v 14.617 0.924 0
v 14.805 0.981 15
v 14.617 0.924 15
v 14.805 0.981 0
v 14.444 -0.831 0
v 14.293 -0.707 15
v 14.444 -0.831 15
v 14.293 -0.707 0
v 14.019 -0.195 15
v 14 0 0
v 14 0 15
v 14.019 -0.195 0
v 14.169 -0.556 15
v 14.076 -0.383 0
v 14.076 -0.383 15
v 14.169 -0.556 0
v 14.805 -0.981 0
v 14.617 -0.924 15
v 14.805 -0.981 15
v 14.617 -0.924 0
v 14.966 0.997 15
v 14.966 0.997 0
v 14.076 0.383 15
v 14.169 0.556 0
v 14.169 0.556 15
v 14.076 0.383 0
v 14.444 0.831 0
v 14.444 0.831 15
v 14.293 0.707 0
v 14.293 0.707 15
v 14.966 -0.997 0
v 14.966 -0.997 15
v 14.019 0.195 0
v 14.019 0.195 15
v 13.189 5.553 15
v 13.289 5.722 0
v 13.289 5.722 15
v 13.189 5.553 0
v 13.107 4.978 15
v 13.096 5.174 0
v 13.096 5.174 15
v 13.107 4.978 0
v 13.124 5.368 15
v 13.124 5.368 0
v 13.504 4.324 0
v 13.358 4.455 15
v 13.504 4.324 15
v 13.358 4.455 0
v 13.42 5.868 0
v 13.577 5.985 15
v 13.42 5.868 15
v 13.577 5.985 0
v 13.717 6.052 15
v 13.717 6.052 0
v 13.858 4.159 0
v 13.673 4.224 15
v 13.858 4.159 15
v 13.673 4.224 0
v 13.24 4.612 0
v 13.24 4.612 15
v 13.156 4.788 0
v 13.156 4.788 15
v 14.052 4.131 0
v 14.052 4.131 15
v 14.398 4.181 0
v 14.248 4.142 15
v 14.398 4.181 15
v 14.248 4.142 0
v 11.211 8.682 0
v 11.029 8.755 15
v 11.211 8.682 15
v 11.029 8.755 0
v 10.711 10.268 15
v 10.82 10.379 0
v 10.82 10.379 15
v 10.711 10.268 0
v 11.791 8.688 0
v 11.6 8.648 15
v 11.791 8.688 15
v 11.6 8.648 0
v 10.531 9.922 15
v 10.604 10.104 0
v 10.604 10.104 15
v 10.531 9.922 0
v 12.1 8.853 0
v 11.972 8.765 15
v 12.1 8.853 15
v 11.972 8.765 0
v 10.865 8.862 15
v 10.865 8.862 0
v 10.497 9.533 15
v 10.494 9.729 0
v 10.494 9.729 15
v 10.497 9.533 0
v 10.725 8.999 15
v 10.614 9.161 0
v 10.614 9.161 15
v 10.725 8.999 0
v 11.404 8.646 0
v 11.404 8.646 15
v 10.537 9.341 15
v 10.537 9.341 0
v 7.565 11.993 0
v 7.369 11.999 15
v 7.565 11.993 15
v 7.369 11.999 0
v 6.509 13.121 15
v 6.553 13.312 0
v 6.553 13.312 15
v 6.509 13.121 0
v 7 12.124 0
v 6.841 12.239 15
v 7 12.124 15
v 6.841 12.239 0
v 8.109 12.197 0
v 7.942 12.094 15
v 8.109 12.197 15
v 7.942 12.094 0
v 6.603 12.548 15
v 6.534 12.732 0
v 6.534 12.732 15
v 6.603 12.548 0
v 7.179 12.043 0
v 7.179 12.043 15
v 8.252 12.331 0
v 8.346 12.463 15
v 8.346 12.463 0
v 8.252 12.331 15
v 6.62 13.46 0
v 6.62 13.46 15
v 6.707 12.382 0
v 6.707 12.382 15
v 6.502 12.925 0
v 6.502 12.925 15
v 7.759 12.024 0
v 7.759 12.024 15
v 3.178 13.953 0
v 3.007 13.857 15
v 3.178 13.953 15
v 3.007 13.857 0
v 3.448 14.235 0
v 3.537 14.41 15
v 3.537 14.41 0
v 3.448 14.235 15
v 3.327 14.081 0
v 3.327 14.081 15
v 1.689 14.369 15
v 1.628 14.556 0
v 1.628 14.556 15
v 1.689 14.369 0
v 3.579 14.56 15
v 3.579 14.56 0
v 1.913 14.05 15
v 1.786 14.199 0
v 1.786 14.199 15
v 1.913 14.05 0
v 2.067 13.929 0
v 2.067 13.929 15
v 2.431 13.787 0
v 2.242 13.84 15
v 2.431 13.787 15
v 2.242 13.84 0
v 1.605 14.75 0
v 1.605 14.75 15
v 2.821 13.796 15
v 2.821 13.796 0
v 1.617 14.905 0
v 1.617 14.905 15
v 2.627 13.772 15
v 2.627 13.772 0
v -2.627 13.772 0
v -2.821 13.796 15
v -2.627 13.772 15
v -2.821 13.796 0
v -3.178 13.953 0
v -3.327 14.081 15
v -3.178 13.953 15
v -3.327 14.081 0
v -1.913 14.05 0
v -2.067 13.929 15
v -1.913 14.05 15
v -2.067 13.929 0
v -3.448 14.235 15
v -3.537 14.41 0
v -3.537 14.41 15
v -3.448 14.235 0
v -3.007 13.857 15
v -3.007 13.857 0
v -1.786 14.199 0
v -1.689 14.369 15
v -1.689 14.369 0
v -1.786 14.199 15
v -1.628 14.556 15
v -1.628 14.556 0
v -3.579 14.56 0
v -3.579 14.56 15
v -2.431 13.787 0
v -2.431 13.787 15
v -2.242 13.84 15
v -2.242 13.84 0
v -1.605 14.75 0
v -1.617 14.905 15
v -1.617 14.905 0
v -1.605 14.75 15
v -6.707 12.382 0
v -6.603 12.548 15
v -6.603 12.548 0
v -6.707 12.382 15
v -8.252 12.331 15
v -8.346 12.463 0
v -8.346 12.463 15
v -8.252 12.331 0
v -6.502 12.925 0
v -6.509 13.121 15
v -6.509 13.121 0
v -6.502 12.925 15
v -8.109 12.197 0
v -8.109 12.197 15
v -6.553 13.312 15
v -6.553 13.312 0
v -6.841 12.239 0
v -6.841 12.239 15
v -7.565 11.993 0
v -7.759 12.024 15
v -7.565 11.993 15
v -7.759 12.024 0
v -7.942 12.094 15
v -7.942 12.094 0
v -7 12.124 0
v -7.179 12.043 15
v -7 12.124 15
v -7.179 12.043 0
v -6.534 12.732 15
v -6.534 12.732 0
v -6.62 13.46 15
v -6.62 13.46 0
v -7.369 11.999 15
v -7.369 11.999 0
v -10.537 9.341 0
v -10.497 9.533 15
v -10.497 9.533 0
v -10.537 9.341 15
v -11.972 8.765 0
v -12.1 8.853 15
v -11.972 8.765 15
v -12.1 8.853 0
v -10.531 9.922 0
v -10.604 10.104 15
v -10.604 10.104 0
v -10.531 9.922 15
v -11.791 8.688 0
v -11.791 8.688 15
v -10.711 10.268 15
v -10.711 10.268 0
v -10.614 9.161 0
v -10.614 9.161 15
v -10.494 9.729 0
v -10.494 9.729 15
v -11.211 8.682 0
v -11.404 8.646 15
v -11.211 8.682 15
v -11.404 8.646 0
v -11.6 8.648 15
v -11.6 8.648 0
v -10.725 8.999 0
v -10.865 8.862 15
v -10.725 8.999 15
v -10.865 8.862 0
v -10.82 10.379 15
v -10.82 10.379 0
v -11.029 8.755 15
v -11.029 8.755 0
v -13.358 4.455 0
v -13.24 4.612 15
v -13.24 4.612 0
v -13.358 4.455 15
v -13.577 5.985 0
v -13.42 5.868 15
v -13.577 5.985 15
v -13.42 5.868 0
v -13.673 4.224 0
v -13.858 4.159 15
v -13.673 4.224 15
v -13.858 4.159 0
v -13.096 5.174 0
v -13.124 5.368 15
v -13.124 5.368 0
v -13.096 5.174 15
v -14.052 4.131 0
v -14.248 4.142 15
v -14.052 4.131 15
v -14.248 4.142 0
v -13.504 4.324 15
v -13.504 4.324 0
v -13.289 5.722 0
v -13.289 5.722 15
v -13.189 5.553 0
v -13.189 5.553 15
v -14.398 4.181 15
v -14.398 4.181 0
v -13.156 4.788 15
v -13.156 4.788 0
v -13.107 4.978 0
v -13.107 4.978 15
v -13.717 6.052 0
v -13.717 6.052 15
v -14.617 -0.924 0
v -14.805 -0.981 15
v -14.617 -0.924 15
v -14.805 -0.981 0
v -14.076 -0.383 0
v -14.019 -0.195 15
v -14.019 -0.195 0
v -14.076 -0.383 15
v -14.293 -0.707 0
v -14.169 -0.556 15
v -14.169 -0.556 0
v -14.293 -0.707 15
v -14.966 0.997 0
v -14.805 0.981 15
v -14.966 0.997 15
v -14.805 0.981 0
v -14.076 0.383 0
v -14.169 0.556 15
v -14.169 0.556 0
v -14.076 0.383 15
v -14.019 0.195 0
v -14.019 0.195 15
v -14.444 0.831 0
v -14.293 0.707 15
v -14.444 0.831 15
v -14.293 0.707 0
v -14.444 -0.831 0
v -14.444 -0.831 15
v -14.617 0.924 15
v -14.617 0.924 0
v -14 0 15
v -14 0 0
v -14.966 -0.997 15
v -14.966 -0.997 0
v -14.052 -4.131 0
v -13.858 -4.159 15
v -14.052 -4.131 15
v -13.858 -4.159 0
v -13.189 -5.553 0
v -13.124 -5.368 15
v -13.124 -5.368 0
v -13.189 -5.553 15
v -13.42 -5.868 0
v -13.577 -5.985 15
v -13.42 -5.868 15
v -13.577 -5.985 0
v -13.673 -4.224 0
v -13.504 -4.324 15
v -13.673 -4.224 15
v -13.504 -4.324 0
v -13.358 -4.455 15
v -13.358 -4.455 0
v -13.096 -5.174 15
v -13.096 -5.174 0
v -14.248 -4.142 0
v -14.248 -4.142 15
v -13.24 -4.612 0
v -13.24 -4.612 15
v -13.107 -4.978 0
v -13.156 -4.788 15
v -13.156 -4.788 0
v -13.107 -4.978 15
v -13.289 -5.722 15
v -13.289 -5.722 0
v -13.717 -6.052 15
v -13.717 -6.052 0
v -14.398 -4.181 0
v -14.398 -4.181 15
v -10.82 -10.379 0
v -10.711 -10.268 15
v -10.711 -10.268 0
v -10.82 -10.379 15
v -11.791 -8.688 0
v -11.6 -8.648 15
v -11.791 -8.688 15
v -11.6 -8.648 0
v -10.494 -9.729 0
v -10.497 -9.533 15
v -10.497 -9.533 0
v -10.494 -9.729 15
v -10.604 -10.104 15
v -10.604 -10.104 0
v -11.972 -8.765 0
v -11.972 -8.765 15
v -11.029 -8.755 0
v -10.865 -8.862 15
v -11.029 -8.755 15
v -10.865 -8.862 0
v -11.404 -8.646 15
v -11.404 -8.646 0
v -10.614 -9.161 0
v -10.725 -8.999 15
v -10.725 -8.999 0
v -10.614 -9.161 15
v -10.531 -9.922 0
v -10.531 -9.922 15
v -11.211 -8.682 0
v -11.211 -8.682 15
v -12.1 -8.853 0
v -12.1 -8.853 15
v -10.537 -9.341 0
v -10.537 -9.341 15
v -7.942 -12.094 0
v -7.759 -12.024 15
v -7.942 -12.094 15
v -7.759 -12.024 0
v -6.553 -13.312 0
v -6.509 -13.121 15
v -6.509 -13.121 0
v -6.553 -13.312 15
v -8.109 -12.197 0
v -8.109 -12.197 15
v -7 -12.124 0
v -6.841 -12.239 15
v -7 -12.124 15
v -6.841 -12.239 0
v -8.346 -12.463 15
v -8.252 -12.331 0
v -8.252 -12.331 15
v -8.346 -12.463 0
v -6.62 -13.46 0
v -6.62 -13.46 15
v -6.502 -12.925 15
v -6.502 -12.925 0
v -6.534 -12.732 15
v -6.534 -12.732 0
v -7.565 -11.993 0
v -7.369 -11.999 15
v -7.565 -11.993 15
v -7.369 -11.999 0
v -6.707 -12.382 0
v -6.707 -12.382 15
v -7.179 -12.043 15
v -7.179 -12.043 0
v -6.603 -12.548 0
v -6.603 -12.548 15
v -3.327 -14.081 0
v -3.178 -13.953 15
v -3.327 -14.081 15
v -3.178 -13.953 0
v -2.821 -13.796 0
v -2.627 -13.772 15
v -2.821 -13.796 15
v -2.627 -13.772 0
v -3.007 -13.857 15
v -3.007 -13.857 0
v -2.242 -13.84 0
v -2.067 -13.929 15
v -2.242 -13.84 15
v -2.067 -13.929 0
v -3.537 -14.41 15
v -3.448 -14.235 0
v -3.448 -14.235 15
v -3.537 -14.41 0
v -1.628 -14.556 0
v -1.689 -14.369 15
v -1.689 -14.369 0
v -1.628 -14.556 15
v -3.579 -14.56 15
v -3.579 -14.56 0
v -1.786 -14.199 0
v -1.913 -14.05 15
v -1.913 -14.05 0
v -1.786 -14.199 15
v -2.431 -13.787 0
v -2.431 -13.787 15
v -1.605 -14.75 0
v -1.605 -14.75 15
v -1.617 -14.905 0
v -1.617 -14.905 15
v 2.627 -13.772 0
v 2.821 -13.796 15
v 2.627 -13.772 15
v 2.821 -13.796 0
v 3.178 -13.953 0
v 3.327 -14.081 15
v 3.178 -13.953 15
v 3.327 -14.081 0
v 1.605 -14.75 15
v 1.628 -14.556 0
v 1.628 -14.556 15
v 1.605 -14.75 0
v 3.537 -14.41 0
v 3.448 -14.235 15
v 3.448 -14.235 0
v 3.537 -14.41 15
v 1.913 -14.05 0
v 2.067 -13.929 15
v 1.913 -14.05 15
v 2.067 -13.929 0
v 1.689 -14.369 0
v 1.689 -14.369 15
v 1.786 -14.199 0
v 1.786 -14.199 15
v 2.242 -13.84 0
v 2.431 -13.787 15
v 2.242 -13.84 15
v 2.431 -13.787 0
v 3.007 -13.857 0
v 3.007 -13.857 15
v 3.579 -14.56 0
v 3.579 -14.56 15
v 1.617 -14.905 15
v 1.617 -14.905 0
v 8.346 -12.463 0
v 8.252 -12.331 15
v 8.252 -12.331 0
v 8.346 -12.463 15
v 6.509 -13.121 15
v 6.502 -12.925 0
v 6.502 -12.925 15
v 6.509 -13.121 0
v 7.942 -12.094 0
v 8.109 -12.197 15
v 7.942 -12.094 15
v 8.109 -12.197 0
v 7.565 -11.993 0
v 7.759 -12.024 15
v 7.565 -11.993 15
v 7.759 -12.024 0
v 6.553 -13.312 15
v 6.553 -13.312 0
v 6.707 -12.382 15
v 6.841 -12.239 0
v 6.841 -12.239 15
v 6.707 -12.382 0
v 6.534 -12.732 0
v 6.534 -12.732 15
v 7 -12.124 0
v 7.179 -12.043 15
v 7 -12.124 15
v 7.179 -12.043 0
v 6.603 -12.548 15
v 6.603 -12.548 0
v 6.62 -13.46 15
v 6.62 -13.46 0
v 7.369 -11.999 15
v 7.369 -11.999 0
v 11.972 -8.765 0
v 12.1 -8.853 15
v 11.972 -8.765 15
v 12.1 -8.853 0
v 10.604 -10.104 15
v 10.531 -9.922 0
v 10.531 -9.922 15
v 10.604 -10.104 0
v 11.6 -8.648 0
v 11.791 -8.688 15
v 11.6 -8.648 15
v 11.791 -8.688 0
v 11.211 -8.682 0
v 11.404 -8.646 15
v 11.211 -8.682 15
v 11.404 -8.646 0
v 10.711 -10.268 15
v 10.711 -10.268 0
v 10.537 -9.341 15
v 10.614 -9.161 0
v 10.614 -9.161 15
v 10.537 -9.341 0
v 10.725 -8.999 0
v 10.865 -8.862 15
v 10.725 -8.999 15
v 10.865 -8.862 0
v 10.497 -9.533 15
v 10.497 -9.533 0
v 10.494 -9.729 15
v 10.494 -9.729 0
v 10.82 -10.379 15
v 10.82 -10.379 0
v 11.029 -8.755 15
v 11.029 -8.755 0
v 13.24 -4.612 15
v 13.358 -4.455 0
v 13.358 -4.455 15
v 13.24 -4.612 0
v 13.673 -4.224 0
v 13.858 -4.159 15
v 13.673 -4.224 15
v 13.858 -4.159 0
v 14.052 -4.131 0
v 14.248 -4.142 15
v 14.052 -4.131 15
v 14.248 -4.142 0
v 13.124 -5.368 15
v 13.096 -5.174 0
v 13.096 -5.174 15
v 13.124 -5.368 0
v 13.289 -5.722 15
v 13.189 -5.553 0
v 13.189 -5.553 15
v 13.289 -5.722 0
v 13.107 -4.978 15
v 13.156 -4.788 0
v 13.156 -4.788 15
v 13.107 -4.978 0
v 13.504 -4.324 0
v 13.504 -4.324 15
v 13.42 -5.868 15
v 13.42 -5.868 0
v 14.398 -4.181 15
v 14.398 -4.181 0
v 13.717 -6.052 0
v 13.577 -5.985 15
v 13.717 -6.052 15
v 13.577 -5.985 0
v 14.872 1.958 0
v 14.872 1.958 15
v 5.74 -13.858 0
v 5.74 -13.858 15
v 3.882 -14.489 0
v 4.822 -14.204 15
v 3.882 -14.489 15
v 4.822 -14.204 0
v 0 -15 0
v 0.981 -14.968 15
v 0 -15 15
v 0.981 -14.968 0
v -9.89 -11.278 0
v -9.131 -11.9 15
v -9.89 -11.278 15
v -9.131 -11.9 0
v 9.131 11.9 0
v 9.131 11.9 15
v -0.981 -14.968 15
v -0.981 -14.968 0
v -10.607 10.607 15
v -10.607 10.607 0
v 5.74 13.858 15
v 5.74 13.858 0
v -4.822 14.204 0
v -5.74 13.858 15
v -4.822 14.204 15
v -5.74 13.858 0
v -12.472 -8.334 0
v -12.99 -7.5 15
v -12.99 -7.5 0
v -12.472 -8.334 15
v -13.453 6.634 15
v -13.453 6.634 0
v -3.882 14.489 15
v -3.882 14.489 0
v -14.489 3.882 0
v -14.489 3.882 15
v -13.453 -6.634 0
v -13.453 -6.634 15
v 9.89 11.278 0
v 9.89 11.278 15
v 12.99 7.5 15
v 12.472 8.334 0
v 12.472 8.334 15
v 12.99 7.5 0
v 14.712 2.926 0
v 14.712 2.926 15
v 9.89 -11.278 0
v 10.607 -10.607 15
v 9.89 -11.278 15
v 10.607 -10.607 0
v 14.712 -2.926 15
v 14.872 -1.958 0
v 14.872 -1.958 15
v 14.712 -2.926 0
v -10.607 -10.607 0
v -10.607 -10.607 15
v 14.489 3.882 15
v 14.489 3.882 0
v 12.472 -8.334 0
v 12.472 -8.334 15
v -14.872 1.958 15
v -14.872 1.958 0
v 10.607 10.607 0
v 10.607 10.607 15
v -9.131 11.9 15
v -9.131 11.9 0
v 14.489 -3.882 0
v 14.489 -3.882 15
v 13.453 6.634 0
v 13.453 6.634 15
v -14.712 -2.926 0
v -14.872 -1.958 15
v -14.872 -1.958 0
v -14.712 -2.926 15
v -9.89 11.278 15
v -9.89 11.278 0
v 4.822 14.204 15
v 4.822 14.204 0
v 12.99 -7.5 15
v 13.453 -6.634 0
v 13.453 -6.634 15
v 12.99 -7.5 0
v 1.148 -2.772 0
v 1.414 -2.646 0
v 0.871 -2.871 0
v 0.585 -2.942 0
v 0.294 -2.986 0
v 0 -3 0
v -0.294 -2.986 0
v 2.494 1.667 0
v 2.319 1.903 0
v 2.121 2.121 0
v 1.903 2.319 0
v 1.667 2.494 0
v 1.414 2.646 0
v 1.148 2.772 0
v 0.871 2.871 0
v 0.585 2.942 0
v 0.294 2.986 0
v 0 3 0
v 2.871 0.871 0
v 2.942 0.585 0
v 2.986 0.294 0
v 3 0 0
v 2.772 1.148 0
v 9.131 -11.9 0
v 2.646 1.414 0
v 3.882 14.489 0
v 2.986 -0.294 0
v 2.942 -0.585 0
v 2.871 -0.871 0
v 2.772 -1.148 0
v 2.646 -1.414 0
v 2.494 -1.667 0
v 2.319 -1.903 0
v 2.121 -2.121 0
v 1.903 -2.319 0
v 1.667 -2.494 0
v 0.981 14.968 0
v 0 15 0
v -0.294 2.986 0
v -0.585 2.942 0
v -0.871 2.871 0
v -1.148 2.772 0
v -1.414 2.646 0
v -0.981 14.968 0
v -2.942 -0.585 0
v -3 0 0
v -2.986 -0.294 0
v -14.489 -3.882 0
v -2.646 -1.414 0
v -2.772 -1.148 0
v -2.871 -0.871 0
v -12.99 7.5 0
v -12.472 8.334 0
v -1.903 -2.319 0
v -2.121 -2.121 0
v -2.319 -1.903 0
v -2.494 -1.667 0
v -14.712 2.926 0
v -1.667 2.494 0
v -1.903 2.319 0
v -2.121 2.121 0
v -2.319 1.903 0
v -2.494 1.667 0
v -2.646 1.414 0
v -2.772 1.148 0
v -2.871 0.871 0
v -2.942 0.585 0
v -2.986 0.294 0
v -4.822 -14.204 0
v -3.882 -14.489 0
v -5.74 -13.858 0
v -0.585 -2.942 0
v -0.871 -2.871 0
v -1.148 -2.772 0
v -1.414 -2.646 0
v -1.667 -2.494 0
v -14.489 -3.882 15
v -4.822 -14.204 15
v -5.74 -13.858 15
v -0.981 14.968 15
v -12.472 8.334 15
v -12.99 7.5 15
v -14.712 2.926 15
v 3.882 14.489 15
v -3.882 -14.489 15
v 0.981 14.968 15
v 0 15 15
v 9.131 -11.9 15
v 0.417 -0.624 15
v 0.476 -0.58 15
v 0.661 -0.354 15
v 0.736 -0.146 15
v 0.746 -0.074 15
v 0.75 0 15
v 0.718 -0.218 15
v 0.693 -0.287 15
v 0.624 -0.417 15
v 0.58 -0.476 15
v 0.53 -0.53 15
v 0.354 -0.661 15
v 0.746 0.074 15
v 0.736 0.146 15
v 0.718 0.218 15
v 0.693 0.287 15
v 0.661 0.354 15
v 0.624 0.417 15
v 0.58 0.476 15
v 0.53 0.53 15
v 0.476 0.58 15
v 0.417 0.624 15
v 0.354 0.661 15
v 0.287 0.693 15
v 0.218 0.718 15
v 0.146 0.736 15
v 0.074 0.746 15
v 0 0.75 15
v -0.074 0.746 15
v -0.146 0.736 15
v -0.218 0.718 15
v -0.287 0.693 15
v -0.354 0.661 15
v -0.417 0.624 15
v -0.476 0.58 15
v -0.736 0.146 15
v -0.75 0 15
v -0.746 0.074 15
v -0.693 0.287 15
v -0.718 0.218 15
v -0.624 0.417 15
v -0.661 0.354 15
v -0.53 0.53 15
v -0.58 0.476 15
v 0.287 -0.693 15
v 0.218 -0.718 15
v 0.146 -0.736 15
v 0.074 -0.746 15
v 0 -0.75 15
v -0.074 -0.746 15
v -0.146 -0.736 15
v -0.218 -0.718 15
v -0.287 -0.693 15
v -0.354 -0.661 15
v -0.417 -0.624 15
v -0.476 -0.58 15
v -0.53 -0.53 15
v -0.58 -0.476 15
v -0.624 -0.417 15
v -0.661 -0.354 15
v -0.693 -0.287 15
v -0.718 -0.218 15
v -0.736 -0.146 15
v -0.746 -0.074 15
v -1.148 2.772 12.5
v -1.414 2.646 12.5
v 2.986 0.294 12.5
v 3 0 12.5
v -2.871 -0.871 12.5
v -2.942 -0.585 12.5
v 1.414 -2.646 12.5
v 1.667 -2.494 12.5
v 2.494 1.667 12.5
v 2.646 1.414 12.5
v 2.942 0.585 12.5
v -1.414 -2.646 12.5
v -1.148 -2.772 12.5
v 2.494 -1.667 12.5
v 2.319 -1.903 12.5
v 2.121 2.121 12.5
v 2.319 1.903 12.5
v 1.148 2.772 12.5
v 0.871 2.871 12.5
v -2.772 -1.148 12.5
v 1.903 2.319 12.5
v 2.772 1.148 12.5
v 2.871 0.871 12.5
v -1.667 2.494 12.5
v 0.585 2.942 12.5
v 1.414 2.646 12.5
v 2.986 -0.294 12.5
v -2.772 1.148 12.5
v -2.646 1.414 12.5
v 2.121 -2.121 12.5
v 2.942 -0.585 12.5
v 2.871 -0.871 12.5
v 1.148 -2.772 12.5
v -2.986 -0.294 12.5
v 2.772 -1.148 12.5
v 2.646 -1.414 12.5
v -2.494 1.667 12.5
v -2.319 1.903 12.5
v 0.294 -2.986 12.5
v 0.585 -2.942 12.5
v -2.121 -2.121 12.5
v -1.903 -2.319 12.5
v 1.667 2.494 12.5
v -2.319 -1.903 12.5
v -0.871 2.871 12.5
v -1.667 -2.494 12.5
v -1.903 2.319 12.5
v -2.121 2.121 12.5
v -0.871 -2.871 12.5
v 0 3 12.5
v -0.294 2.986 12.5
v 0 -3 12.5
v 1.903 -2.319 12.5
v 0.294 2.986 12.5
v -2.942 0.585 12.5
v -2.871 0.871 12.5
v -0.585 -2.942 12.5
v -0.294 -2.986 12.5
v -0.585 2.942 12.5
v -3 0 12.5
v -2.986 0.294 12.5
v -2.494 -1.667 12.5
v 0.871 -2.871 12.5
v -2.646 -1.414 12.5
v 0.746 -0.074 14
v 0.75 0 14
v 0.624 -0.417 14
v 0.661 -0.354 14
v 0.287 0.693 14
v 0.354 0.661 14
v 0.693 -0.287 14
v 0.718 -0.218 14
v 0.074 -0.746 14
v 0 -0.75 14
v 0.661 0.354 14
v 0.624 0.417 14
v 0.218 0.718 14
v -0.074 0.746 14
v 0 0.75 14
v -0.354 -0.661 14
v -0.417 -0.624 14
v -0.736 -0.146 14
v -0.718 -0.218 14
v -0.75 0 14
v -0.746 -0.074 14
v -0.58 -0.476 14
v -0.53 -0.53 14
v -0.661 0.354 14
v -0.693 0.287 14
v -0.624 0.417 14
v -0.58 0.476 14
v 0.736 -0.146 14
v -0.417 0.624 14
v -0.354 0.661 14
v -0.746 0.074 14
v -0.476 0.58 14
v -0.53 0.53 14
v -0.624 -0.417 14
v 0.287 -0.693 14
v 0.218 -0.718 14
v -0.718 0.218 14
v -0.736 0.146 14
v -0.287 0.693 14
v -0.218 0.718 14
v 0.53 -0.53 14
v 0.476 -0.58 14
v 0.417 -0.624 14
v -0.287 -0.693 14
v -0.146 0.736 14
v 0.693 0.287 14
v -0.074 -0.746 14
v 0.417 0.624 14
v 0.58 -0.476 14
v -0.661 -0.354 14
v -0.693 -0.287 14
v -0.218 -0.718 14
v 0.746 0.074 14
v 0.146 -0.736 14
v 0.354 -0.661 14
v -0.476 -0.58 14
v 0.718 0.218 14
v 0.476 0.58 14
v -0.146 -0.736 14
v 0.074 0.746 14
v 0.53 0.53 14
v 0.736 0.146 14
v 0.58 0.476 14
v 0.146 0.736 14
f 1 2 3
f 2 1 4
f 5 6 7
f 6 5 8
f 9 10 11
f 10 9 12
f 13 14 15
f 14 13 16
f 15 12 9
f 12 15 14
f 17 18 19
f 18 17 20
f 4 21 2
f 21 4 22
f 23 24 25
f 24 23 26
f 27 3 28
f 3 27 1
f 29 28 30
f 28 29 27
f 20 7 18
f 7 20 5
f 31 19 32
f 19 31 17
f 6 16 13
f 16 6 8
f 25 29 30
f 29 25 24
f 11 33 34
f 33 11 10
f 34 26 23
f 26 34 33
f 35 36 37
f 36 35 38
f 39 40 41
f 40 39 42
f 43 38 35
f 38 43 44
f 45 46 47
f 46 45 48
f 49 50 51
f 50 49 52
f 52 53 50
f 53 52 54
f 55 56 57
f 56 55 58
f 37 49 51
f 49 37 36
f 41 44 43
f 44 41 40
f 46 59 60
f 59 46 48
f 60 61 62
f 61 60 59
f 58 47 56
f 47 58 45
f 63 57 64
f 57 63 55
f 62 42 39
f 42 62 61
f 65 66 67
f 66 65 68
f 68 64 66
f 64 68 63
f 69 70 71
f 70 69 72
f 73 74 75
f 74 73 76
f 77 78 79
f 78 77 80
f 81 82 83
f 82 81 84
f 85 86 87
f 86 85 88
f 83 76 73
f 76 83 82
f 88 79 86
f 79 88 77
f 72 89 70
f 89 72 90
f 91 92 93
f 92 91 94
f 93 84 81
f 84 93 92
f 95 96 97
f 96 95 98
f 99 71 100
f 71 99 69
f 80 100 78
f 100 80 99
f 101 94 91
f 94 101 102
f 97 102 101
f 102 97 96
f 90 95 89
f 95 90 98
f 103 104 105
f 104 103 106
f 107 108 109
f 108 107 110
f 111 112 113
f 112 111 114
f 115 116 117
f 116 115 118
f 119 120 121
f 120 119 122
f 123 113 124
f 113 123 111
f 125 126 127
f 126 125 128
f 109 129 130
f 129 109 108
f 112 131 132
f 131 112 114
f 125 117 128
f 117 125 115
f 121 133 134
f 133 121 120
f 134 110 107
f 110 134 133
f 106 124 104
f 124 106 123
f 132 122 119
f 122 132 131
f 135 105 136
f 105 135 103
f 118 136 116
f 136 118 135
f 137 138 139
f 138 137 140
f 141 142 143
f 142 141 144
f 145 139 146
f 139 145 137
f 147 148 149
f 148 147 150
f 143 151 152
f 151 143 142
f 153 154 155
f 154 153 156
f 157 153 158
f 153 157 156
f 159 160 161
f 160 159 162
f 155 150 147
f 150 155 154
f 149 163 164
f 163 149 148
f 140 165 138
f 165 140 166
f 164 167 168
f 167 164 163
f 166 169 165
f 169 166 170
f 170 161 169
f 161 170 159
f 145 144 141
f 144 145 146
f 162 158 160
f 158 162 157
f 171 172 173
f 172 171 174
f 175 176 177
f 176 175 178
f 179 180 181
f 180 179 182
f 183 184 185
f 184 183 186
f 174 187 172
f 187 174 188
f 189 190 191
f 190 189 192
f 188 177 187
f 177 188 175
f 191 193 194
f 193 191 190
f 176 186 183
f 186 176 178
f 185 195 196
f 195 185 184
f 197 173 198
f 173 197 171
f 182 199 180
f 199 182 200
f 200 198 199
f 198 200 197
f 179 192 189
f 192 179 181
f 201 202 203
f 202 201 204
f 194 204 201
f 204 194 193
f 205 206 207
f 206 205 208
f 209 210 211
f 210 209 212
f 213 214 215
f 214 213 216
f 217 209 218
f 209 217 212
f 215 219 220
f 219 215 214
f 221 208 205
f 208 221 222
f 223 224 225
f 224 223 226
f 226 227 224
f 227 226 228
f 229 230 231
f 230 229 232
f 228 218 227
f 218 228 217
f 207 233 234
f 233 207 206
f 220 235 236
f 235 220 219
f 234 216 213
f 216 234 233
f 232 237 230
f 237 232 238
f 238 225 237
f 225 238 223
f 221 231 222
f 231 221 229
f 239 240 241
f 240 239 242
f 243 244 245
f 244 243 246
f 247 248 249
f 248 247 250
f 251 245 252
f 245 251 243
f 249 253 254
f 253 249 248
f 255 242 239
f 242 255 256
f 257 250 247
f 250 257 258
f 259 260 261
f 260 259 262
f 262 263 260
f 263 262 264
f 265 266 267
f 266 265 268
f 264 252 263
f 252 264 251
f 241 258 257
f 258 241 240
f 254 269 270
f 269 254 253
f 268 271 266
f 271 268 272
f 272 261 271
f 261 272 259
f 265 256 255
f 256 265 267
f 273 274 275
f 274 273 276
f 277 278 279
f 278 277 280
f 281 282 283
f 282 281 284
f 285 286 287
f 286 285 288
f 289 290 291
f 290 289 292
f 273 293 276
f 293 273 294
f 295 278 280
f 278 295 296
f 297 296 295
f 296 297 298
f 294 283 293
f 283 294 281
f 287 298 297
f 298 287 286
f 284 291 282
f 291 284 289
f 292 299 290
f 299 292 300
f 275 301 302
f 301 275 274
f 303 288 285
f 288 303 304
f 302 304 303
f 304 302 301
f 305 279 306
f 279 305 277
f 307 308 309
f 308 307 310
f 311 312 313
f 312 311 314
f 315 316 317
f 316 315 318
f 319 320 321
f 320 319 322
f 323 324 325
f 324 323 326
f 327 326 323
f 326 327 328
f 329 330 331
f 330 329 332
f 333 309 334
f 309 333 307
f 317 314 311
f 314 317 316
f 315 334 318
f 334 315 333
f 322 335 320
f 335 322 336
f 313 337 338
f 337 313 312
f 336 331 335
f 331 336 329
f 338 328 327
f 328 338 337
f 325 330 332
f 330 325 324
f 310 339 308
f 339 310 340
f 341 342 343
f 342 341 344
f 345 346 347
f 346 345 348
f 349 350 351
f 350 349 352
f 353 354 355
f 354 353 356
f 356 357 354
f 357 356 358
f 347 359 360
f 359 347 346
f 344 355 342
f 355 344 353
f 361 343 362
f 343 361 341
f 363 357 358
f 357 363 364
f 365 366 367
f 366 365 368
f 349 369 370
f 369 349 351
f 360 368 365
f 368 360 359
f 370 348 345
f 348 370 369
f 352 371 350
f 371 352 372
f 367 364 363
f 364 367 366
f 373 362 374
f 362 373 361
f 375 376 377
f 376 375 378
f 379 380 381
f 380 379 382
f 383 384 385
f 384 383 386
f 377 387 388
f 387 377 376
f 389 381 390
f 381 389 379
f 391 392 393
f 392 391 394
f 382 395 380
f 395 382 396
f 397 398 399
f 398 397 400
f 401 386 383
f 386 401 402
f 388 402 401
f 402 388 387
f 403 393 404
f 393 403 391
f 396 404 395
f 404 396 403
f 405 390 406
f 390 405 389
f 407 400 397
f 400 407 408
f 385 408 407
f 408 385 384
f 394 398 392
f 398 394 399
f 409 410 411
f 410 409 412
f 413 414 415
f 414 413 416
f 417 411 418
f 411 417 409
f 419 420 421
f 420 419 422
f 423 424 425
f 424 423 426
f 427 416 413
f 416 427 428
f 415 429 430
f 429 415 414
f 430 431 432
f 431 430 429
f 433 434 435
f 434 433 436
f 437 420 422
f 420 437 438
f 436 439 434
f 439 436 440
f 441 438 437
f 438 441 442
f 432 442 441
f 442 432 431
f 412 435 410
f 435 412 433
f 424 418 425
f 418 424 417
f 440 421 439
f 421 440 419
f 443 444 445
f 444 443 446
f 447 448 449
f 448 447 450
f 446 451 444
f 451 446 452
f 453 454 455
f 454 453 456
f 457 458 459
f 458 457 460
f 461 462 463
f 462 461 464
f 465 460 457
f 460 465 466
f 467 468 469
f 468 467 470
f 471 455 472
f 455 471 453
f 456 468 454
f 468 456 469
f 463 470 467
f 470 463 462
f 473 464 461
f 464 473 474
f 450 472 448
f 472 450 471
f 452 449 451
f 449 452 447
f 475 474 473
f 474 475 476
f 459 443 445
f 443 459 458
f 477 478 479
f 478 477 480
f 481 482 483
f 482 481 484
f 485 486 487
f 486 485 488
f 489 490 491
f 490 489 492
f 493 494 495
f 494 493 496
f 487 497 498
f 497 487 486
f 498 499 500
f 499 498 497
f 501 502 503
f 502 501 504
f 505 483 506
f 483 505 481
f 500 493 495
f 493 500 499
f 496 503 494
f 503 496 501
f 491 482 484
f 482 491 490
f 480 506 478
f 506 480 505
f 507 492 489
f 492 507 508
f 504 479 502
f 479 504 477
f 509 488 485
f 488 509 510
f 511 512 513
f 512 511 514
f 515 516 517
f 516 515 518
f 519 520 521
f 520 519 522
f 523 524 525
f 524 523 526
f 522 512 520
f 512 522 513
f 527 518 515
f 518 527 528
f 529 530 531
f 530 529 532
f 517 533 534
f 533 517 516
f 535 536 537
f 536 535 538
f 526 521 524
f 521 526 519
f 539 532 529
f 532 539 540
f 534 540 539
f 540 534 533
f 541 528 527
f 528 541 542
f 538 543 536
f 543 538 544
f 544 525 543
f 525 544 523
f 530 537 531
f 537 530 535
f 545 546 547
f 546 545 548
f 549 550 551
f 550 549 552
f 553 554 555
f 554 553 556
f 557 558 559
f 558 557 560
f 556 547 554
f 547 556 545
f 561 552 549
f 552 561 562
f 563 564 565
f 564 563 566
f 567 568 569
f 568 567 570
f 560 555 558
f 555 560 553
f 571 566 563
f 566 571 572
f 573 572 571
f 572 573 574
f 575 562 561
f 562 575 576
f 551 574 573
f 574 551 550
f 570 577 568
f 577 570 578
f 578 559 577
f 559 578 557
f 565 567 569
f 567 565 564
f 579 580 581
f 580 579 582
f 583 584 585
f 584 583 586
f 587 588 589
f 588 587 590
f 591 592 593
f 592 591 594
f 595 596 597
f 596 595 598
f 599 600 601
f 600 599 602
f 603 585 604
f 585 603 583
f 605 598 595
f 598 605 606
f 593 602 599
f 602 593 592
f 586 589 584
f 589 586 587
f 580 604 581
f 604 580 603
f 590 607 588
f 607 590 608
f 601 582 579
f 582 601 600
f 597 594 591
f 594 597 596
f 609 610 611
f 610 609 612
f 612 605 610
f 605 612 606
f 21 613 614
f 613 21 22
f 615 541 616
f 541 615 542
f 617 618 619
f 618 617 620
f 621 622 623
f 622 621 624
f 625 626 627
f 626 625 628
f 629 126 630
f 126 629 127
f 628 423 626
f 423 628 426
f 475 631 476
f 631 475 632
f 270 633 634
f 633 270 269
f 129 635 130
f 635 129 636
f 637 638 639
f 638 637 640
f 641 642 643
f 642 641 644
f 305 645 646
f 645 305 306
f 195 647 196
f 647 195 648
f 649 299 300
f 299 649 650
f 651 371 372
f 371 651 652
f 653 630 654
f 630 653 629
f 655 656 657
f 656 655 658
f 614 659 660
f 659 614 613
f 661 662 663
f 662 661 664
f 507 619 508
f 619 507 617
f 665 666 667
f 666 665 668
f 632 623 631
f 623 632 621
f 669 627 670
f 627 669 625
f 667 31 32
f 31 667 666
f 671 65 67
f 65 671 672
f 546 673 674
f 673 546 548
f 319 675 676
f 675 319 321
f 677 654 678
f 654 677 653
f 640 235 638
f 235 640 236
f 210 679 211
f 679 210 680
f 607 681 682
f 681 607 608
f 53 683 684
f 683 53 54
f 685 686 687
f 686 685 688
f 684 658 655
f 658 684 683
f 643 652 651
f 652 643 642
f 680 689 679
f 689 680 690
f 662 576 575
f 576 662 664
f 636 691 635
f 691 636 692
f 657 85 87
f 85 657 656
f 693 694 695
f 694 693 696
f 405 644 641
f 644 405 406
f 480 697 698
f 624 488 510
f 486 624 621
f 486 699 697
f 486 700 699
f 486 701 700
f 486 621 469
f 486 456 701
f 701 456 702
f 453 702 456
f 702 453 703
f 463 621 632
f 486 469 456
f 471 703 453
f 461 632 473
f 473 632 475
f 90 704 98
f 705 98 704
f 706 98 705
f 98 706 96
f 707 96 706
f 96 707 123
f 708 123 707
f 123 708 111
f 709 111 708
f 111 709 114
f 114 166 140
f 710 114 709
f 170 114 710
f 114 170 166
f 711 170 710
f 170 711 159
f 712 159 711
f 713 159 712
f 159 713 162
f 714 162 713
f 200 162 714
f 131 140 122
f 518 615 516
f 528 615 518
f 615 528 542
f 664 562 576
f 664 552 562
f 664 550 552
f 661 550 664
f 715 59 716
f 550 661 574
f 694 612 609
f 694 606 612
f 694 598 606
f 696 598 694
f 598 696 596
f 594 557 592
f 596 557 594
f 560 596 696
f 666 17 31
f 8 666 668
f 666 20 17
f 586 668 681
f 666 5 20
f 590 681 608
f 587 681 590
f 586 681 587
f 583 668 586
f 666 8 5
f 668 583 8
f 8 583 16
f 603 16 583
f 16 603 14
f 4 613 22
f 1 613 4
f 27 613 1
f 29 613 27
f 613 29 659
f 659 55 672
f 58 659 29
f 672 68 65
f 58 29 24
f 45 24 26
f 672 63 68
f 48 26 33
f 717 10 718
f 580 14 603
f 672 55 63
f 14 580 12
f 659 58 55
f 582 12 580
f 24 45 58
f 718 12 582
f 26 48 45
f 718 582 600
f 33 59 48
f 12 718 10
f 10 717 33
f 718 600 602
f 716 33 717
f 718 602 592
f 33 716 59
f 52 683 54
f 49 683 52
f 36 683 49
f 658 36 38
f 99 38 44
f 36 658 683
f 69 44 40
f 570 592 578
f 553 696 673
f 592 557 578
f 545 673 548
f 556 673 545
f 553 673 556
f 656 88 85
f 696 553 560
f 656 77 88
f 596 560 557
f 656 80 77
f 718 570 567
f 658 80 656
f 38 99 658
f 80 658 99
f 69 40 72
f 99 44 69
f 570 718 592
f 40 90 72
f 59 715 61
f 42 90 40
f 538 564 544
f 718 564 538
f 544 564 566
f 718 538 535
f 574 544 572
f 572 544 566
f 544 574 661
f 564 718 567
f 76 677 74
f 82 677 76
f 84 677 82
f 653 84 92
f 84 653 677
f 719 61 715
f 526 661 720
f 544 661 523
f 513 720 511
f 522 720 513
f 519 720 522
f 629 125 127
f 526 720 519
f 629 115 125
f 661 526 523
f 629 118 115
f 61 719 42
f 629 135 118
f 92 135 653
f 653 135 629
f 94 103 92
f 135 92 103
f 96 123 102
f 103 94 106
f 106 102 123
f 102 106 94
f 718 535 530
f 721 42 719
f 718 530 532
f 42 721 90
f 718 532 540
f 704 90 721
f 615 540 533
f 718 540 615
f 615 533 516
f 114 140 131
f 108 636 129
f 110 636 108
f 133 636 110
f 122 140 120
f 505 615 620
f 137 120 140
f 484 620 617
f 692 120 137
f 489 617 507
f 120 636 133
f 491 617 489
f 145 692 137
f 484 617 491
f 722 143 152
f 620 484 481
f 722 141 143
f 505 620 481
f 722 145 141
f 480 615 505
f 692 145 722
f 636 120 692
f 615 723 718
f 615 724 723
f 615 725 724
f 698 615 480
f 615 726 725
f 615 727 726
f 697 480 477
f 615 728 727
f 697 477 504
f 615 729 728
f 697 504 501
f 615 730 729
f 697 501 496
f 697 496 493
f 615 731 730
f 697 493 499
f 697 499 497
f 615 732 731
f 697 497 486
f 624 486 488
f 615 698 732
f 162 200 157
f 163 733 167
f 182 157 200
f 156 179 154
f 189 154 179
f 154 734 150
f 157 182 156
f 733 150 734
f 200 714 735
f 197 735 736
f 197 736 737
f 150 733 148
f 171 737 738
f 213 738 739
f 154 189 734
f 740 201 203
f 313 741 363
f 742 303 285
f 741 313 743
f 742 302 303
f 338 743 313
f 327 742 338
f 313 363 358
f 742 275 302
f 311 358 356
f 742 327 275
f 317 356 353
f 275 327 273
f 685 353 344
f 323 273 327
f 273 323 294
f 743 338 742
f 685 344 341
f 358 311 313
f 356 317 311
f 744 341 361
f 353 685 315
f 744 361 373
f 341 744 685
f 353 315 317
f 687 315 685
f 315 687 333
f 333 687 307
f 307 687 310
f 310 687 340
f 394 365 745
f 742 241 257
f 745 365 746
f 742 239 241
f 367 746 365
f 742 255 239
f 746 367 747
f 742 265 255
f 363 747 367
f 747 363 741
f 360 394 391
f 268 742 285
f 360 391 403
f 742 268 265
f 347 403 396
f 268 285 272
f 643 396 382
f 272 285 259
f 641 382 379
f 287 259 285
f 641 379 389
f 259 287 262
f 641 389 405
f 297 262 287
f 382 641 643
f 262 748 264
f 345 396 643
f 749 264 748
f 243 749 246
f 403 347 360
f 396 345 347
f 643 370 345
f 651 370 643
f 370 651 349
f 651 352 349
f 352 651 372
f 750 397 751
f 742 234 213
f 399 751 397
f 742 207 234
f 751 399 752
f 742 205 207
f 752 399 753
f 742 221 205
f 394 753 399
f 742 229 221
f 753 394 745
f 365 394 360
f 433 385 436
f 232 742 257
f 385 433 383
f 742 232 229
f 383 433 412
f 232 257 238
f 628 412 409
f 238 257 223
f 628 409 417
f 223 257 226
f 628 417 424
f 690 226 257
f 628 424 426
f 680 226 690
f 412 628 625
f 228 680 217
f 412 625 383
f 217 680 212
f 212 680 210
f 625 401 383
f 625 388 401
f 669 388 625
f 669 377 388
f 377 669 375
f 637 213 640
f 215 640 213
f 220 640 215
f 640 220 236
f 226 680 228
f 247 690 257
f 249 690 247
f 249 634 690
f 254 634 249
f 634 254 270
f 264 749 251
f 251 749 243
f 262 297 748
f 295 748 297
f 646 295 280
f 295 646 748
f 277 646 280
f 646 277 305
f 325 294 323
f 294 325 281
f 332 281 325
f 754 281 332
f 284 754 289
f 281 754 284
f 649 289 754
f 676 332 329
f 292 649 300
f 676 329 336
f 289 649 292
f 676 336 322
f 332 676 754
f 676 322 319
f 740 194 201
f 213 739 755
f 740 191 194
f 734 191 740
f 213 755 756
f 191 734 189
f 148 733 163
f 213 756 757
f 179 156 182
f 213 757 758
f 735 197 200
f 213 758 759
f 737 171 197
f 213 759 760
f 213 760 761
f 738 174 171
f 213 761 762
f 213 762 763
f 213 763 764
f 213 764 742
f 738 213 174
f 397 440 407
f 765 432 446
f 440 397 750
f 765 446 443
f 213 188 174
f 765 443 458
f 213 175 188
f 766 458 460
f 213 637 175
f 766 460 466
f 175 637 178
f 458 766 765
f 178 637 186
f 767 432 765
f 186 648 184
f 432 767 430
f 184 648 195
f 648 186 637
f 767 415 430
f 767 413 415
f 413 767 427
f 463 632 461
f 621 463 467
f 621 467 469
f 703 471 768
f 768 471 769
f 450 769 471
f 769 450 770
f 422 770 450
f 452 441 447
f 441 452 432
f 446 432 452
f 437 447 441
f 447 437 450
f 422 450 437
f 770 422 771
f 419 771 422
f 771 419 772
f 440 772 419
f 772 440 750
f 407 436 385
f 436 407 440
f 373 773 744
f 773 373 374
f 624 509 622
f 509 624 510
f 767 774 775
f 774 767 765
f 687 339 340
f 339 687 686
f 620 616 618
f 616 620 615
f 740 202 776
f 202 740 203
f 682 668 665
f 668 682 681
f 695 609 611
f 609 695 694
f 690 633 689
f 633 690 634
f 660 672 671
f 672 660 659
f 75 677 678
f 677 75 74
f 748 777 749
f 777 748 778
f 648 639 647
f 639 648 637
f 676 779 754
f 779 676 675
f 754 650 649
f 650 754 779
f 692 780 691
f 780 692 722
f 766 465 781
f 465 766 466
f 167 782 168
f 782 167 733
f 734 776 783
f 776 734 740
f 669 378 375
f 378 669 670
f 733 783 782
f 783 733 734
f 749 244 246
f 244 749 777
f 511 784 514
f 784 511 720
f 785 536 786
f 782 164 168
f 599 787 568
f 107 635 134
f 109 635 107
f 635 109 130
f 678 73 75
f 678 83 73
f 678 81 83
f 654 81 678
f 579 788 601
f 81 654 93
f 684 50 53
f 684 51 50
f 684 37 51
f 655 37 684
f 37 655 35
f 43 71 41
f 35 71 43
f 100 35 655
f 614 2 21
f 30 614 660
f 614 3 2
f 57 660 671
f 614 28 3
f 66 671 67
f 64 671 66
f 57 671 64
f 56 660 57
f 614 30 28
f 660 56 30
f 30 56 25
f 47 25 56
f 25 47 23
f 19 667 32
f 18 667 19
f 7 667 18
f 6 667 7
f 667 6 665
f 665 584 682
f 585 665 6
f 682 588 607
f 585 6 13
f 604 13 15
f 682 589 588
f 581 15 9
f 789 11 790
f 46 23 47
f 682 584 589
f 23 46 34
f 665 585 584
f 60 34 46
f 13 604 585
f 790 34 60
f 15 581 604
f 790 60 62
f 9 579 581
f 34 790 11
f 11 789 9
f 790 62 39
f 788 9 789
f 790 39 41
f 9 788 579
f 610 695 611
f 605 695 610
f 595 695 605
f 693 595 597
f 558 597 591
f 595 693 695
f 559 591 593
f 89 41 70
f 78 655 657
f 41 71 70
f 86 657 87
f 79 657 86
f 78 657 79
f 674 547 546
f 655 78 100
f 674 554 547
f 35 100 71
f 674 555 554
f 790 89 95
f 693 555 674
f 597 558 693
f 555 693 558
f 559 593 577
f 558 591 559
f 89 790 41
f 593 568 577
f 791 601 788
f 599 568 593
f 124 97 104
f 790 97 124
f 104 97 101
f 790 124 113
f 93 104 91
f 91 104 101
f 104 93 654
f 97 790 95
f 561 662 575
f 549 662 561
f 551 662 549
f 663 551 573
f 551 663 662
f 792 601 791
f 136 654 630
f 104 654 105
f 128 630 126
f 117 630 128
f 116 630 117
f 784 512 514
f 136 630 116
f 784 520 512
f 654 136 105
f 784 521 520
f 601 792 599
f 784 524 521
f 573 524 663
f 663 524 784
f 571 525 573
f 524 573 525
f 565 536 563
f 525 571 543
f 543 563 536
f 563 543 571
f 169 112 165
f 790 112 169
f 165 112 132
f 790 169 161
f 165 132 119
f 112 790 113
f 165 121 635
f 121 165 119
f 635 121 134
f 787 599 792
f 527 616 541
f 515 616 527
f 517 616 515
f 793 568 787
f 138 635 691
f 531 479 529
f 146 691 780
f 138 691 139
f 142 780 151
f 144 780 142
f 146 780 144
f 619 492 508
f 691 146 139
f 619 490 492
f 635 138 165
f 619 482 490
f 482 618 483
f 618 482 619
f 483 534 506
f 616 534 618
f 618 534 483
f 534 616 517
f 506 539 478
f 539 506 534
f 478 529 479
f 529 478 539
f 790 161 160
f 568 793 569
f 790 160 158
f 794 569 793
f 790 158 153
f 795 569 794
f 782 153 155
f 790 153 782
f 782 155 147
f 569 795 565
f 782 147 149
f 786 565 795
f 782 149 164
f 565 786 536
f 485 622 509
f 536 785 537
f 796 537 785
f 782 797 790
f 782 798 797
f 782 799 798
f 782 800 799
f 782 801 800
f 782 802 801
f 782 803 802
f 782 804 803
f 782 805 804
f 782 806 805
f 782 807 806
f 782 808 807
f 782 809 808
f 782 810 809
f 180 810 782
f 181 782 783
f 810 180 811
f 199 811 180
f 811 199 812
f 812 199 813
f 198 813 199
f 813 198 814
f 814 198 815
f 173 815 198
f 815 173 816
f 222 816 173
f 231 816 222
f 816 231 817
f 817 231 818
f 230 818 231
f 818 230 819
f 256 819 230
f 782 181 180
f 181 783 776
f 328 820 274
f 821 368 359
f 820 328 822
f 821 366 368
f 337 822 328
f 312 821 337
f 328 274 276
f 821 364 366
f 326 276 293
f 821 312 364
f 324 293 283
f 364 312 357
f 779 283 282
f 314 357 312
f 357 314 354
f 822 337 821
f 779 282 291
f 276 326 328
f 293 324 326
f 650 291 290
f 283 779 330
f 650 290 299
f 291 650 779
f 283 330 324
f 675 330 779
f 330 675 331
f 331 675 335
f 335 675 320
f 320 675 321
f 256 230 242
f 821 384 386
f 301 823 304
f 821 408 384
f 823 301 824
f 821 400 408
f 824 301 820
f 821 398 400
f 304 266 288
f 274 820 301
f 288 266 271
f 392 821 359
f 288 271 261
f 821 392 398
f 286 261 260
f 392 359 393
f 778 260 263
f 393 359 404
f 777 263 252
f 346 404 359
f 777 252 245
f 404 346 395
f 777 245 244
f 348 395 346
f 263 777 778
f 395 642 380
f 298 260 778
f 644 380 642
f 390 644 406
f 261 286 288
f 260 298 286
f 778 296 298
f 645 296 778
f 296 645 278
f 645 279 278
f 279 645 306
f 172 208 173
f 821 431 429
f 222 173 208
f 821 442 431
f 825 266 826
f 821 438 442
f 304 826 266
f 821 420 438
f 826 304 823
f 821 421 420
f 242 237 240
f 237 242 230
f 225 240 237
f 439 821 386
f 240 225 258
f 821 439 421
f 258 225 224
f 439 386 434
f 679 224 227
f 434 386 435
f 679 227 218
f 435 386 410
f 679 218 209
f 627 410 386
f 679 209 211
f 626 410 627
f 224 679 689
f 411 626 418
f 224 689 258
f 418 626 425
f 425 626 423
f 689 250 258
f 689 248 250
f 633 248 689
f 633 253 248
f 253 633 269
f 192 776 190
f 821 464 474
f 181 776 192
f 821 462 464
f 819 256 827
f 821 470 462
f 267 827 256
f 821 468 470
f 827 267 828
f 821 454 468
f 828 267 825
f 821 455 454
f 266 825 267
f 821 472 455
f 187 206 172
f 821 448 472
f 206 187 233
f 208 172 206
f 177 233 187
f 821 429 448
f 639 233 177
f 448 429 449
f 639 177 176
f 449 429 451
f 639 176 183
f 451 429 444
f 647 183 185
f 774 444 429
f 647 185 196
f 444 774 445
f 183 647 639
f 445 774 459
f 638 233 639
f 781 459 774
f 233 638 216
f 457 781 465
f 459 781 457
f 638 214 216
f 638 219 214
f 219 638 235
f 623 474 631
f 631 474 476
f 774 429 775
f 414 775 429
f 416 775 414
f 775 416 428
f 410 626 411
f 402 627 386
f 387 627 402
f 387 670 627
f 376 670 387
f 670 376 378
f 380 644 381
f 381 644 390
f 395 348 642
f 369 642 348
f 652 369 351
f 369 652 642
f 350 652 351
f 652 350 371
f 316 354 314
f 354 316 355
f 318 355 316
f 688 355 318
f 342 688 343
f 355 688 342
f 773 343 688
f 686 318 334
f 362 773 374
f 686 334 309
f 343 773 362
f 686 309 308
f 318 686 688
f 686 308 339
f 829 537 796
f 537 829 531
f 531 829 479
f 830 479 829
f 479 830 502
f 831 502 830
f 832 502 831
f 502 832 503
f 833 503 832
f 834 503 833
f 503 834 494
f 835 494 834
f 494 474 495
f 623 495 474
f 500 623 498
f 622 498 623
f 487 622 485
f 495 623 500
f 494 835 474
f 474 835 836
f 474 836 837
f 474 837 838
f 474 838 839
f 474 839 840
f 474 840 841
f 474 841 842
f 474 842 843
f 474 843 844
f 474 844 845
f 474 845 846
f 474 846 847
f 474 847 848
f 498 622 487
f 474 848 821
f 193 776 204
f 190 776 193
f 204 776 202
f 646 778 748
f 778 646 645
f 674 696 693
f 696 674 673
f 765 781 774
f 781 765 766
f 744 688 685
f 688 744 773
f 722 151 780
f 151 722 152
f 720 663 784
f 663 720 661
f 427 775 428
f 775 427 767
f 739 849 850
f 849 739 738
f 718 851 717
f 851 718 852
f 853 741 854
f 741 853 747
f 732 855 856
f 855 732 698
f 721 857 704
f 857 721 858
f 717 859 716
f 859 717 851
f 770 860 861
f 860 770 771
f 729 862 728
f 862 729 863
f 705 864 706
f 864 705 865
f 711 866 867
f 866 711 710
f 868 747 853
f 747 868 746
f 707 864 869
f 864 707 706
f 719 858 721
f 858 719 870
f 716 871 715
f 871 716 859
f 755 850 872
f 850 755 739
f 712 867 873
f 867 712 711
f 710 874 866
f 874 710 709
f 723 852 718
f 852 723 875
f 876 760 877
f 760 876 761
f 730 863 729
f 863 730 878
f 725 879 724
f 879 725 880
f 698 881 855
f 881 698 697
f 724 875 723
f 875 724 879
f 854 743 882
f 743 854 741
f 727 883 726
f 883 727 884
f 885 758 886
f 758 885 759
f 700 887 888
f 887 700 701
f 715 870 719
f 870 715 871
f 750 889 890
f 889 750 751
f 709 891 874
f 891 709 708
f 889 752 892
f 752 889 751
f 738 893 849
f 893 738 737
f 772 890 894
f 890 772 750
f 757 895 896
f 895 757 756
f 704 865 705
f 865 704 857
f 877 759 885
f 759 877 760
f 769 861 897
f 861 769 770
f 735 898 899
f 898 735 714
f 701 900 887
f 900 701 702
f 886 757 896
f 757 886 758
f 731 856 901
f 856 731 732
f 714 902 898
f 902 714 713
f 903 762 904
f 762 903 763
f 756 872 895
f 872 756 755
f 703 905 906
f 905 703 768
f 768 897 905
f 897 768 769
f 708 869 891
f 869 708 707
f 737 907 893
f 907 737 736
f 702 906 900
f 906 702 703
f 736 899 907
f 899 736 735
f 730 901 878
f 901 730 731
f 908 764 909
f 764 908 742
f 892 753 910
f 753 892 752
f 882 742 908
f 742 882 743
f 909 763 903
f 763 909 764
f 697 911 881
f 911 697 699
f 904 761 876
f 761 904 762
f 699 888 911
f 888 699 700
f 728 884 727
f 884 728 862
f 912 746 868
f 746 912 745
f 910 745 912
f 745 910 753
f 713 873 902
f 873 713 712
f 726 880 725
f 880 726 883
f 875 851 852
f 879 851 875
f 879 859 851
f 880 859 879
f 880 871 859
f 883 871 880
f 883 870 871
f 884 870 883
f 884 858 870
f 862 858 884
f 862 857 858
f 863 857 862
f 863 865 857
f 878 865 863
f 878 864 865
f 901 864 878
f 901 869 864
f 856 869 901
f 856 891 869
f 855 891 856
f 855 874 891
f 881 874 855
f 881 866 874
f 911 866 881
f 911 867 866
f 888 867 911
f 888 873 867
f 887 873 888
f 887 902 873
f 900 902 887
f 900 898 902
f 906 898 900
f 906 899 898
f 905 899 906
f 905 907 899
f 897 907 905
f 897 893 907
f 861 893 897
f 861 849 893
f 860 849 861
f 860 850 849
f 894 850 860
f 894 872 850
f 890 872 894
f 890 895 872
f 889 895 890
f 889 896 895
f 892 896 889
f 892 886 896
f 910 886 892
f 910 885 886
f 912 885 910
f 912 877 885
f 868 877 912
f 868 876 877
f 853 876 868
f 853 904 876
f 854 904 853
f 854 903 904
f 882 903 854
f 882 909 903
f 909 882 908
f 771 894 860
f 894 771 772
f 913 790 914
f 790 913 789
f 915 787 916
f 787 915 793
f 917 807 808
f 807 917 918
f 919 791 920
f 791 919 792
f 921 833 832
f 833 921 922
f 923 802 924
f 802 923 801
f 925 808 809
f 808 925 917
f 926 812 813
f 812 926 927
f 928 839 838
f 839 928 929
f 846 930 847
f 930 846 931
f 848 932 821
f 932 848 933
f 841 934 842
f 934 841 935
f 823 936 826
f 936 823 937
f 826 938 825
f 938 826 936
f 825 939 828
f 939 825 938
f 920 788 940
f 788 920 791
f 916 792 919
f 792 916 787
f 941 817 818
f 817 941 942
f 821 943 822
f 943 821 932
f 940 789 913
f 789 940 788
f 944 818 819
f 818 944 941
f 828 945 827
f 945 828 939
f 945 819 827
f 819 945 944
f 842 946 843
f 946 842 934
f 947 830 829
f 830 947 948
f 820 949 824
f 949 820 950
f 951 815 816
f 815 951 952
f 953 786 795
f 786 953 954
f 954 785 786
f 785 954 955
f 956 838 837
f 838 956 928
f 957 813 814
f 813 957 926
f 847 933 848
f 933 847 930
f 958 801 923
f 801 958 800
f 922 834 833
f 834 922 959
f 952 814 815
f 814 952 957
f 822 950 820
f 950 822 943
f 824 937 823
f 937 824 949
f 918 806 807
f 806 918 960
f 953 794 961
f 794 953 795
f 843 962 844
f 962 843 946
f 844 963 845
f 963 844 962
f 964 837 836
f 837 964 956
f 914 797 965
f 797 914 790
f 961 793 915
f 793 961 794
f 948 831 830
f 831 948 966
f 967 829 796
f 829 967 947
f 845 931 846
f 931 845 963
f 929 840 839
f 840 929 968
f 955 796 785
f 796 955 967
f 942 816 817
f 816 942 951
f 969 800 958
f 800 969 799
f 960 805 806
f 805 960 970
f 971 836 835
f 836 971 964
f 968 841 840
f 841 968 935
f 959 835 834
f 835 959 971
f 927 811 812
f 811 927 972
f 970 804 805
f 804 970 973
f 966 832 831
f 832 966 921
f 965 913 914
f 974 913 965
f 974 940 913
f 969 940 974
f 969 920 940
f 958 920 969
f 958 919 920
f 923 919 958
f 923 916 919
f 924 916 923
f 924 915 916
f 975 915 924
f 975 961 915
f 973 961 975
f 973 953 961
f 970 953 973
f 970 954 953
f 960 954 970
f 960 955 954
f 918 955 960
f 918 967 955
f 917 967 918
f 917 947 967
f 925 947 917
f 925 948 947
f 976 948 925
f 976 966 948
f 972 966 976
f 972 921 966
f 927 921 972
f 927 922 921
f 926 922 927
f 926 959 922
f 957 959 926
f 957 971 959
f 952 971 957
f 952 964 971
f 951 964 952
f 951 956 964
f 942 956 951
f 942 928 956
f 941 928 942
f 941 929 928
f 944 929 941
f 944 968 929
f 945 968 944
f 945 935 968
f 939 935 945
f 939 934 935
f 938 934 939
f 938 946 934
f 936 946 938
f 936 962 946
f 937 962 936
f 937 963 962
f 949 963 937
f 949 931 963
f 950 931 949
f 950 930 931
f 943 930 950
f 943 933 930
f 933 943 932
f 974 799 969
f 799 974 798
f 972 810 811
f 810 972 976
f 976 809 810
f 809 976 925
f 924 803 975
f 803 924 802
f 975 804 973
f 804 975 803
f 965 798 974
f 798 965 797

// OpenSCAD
// Replacement knob for hotplate stirrer with D-shaft
// Print orientation: bottom face (with D-bore) on bed, z = 0

// ---- Dimensions ----
knob_d        = 30;    // knob outer diameter
knob_h        = 15;    // knob height
bore_depth    = 12;    // D-bore depth from bottom face
shaft_d       = 6;     // D-shaft diameter
bore_flat     = 4.7;   // distance from D-bore flat to opposite side
groove_count  = 18;    // number of grip grooves
groove_d      = 2;     // grip groove diameter (half-cylinder)
pointer_w     = 1.5;   // pointer groove width
pointer_d     = 1;     // pointer groove depth
eps           = 0.5;   // cutter overshoot past faces

$fn = 96;

// ---- Model ----
difference() {
    // Main knob body
    cylinder(d = knob_d, h = knob_h);

    // D-shaped blind bore from bottom face
    translate([0, 0, -eps])
        cylinder(d = shaft_d, h = bore_depth + 2 * eps, $fn = 64);

    // Vertical grip grooves around full height
    for (i = [0 : groove_count - 1])
        rotate([0, 0, i * 360 / groove_count])
            translate([knob_d / 2, 0, -eps])
                cylinder(d = groove_d, h = knob_h + 2 * eps, $fn = 32);

    // Pointer groove on top face, centre to outer edge
    translate([0, 0, knob_h - pointer_d])
        linear_extrude(height = pointer_d + eps)
            circle(d = pointer_w, $fn = 64);
}
